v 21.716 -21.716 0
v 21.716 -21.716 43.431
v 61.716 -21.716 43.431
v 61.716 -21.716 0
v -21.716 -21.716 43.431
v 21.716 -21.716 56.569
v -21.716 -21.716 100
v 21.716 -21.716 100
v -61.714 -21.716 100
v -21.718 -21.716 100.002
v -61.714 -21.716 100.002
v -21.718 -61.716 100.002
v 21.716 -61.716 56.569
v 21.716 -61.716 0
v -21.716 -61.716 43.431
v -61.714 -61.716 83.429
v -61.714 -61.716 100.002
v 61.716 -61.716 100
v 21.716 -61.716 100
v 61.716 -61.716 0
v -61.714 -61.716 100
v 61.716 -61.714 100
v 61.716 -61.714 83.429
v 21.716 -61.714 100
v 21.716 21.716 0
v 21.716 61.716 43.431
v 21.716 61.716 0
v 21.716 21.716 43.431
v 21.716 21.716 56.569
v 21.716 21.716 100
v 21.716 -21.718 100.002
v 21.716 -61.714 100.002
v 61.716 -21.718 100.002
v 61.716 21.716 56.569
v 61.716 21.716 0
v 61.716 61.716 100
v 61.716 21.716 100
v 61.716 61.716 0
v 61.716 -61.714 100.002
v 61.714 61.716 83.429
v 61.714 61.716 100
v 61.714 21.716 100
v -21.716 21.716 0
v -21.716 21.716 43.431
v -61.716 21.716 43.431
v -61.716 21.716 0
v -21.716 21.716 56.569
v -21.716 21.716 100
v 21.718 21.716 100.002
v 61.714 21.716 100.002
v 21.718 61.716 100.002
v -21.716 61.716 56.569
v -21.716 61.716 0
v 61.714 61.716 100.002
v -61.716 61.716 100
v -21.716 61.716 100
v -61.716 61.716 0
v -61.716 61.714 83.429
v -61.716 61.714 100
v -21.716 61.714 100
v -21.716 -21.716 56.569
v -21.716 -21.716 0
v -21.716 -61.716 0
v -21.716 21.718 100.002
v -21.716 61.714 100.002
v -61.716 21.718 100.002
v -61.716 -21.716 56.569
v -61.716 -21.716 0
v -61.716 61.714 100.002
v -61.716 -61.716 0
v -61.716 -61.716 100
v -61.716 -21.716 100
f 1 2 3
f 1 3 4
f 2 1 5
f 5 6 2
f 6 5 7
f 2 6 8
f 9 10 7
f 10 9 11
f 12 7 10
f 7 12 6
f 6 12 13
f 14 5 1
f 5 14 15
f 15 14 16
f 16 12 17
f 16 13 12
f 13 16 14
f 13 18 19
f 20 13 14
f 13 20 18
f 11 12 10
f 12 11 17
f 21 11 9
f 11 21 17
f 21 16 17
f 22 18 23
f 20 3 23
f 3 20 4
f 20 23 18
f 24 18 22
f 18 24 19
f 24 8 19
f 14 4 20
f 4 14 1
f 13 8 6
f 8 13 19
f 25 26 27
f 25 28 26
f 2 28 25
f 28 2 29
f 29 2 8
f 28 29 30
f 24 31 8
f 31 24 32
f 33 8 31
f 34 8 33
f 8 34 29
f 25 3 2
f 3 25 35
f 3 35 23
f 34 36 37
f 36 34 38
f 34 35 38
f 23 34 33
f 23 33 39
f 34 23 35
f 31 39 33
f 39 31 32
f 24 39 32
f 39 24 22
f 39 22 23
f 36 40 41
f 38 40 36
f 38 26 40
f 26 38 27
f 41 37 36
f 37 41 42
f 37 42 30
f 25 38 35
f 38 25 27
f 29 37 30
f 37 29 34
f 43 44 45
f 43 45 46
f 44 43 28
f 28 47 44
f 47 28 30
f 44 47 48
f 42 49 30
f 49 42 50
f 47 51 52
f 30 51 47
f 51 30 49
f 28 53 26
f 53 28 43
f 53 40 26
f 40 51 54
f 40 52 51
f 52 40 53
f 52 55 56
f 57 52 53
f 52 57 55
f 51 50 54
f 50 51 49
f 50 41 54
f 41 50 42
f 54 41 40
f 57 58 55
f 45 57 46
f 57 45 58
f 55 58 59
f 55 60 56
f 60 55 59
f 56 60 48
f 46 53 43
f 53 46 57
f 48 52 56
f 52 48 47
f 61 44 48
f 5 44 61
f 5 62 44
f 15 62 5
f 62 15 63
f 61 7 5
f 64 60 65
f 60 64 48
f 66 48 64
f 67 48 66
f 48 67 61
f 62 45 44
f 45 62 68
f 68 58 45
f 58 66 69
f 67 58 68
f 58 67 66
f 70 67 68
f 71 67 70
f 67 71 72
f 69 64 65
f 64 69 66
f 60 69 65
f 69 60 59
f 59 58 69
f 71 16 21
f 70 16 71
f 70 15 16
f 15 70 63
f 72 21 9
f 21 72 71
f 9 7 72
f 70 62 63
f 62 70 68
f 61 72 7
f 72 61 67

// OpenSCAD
h = 100;
w = 40;
l = h-sqrt(2*w*w)+2*w;

//for compensating openscad rendering glitches 
eps = 0.002;

module vpart(){
    difference(){
        translate([l-w,0,0])rotate([0,-45,0]) cube([w,w,h+sqrt(2*w*w)]);
    translate([-eps,-eps,h+eps]) cube([w+2*eps,w+2*eps,w+2*eps]);
    translate([-w-eps,-eps,0]) cube([w+2*eps,w+2*eps,h+sqrt(2*w*w)]);
        }
    translate([l-w,0,0]) cube([w,w,h]);

    
    }

module n64_logo() {
vpart();
translate([l,0,0]) rotate([0,0,90]) vpart();
translate([l,l,0]) rotate([0,0,180]) vpart();
translate([0,l,0]) rotate([0,0,270]) vpart();
}

color([0.3,0.7,0.1]) rotate([0,0,$t*360]) translate([-l/2,-l/2,0]) n64_logo();
